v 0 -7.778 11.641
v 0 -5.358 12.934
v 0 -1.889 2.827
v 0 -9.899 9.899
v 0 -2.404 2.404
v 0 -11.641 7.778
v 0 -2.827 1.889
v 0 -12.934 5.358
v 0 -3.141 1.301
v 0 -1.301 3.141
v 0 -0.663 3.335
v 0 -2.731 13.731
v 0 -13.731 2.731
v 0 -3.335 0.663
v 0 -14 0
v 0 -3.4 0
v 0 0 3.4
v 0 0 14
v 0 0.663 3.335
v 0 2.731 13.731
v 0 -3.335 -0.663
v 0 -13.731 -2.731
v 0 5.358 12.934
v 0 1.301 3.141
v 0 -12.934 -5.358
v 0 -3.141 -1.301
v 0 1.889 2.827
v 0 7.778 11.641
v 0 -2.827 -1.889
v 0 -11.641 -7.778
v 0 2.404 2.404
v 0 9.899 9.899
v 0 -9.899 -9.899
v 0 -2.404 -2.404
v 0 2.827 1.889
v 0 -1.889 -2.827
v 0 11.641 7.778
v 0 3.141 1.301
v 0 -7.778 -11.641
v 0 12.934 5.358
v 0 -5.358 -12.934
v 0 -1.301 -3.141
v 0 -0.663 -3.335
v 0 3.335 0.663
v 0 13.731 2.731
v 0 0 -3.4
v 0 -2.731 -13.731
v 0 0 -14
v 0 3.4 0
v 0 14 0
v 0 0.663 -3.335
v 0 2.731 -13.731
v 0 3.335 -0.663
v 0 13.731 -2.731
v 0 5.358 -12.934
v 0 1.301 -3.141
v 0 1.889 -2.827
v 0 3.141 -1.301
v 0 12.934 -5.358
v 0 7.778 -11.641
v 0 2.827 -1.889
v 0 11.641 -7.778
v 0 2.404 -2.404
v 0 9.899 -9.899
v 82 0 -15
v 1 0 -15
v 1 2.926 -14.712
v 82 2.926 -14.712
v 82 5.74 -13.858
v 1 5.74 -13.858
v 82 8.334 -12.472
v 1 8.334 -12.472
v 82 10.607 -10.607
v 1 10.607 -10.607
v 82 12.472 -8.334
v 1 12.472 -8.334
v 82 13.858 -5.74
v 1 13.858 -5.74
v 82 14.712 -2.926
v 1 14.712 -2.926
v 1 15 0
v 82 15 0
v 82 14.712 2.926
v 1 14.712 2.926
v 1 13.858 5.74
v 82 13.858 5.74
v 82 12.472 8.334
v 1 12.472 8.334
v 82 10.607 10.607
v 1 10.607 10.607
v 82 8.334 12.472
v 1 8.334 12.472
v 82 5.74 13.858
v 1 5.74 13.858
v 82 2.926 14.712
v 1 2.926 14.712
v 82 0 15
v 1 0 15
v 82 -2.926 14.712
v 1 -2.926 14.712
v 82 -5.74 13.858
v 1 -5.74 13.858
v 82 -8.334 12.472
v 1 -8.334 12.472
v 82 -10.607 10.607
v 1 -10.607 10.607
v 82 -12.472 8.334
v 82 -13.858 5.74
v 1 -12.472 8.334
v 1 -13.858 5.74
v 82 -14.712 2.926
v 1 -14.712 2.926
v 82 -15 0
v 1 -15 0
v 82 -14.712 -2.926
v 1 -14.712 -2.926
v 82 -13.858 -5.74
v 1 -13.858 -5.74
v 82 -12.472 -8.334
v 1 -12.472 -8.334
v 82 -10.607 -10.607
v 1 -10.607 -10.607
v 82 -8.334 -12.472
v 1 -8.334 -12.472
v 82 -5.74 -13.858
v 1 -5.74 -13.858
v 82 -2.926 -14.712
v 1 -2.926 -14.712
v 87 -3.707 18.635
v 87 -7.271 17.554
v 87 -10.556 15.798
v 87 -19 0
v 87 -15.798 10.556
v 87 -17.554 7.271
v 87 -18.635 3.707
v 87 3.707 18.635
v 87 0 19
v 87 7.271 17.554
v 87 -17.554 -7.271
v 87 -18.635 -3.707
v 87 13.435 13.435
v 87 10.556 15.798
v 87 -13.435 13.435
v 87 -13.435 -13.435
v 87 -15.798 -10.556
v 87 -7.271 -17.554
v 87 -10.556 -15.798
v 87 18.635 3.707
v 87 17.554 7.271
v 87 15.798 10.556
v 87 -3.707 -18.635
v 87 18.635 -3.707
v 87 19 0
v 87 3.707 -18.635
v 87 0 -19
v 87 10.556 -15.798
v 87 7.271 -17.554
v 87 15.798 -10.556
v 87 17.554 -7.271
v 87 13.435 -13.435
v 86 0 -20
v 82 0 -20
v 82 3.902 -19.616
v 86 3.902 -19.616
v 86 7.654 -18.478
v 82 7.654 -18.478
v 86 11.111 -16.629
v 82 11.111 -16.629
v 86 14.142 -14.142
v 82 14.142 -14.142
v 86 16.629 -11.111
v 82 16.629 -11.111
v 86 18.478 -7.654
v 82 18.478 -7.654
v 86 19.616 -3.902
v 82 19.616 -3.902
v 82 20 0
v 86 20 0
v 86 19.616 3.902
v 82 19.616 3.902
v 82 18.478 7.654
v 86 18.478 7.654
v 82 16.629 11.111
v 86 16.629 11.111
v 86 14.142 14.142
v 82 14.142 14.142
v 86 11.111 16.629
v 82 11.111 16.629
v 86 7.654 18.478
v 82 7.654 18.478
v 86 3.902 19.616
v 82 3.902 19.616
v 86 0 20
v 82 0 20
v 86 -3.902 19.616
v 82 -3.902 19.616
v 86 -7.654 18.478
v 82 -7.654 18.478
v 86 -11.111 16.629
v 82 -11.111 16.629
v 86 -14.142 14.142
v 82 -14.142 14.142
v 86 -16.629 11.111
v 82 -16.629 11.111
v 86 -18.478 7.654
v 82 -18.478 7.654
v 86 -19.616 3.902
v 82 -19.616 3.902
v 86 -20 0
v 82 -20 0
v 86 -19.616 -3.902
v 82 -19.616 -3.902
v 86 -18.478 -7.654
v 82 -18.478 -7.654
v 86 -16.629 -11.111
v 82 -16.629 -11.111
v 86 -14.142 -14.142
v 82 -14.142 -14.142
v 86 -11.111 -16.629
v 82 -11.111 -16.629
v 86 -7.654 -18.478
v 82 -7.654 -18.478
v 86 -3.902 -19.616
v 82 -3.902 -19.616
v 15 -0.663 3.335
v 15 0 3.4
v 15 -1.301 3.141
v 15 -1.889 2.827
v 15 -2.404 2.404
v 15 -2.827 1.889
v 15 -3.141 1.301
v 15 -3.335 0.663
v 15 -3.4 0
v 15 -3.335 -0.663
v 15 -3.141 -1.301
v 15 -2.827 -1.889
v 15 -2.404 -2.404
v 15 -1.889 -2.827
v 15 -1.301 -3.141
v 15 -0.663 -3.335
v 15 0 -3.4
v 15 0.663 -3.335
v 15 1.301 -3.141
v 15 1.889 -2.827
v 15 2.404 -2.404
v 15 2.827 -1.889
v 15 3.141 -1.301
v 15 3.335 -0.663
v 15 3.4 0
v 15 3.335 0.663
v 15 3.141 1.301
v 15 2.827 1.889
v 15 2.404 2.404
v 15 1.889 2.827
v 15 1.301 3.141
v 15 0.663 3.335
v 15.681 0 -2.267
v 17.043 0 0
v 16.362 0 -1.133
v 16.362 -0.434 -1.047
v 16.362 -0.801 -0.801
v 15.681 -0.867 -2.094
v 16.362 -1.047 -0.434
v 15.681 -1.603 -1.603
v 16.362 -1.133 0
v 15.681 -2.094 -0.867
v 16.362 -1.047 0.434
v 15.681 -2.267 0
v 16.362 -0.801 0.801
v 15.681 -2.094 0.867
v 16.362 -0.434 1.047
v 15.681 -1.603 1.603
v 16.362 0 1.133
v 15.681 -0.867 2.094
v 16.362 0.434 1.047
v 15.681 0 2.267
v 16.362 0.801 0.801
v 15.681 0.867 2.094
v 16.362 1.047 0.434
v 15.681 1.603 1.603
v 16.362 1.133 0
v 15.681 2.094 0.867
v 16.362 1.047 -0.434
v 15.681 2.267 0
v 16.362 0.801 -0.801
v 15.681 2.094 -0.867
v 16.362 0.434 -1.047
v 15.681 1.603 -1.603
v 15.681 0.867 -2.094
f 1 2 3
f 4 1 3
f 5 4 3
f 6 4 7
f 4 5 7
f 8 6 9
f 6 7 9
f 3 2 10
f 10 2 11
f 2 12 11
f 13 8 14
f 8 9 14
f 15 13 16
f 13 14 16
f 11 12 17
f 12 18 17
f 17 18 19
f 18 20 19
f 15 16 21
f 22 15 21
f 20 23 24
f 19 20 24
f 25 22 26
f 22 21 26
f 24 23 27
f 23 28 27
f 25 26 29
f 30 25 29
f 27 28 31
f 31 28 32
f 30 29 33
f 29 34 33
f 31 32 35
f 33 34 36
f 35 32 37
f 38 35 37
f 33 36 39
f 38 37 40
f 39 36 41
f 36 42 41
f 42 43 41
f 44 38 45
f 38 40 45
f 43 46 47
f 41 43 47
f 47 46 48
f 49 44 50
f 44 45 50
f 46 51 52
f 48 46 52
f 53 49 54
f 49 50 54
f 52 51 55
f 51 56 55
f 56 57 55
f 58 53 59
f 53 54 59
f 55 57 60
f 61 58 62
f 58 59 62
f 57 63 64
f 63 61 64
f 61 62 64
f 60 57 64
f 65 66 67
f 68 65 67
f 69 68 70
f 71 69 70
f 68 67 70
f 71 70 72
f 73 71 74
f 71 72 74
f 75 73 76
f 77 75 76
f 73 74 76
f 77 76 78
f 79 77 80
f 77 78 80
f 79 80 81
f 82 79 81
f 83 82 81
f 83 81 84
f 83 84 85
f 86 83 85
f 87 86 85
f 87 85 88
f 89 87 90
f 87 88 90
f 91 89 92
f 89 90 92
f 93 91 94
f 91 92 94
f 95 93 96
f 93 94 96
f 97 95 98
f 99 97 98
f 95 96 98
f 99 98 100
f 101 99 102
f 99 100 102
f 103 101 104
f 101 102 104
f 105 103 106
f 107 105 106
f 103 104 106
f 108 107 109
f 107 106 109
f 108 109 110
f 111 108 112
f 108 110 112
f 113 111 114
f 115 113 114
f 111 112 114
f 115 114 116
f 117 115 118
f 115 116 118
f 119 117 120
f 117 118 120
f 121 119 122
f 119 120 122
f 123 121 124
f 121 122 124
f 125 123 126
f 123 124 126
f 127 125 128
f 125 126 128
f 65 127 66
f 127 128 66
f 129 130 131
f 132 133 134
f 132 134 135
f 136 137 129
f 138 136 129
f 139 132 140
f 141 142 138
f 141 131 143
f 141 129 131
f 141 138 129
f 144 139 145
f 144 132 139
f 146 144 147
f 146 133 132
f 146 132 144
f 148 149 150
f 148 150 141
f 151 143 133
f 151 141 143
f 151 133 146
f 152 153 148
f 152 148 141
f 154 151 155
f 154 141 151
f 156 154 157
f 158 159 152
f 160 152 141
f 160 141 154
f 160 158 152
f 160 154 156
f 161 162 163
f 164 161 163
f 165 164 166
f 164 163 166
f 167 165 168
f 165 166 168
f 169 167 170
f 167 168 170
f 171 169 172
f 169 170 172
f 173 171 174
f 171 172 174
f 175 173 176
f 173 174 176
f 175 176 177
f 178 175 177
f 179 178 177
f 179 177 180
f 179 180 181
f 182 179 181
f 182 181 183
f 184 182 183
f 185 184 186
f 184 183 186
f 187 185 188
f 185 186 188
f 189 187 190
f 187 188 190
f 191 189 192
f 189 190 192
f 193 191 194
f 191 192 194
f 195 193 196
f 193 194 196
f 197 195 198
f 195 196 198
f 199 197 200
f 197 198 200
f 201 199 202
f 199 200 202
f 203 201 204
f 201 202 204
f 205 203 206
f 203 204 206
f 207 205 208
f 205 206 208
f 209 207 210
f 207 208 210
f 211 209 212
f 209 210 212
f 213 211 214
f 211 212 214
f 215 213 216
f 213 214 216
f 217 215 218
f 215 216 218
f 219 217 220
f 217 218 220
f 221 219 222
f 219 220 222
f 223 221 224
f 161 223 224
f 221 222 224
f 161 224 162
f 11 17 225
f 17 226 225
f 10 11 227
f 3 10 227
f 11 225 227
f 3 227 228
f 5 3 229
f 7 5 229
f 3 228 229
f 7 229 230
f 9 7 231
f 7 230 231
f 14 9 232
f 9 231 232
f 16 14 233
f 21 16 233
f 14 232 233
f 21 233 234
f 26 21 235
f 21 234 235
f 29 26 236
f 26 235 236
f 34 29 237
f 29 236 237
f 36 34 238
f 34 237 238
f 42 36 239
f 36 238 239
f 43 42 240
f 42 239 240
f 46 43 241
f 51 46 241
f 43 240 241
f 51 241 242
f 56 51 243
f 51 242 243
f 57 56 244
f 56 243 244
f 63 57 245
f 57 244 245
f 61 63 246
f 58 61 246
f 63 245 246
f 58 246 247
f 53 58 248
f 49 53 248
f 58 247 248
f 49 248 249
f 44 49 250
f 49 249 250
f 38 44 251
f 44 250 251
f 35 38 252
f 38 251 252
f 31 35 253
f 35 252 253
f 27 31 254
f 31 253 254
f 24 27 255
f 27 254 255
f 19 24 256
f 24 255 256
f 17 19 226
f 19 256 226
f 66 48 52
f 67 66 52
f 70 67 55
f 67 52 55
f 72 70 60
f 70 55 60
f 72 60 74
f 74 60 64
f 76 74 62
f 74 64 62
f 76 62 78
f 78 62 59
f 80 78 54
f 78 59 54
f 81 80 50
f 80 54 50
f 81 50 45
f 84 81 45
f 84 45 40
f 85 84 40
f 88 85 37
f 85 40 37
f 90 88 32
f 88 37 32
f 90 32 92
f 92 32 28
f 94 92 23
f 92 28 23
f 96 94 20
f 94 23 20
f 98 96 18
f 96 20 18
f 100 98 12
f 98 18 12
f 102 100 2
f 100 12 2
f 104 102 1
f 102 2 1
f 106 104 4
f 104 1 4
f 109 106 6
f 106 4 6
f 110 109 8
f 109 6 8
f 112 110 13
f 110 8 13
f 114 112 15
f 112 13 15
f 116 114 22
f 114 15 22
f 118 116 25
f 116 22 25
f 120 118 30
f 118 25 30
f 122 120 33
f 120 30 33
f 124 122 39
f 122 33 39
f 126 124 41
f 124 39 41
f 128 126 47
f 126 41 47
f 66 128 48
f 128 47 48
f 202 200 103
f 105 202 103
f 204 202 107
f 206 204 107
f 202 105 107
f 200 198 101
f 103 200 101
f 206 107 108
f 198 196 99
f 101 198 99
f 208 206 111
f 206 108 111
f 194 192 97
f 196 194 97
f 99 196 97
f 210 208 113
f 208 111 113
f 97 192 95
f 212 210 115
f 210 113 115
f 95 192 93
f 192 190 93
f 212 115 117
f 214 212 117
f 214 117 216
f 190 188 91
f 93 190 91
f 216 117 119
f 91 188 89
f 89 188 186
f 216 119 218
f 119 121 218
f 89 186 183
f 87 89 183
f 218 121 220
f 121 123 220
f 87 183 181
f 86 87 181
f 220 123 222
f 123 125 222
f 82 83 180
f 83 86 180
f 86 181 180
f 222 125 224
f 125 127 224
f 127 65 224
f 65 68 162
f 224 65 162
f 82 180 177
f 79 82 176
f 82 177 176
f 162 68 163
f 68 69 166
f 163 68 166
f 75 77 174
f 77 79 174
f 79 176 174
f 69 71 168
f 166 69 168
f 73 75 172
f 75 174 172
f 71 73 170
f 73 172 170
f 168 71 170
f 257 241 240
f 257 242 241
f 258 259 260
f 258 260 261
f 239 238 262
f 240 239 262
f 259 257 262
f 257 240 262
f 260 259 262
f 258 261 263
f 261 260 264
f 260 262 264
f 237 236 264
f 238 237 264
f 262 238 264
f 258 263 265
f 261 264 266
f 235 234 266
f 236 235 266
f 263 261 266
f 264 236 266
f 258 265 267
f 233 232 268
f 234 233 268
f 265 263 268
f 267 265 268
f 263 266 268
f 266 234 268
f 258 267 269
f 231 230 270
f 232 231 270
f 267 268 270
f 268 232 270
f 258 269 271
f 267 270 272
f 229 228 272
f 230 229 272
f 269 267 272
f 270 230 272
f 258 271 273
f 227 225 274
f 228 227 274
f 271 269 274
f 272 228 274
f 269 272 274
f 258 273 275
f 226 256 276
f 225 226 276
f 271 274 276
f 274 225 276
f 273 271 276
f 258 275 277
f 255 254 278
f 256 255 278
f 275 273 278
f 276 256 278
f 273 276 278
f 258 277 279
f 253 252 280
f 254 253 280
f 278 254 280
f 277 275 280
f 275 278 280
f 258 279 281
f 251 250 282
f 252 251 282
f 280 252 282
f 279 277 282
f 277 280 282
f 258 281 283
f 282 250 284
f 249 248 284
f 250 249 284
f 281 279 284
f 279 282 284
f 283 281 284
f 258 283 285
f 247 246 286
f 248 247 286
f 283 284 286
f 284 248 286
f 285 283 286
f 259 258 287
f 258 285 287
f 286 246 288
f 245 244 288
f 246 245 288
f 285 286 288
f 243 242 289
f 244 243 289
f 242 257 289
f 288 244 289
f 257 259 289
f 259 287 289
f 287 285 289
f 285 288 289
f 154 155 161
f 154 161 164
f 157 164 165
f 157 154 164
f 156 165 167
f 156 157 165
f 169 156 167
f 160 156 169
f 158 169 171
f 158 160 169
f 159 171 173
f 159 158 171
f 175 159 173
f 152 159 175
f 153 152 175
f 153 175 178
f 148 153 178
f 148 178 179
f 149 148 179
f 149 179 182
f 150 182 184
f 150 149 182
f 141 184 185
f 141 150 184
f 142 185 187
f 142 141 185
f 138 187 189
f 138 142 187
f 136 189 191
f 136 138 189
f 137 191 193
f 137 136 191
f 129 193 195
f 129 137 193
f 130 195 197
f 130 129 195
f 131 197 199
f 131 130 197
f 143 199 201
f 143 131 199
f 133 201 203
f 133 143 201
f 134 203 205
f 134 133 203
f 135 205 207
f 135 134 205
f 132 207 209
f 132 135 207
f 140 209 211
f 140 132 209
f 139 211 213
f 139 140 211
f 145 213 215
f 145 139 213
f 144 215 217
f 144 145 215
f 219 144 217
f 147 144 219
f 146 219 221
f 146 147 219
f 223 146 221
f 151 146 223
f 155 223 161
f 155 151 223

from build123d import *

# Parameters (mm, degrees)
SKETCH_1_R             = 15
EXTRUDE_1_DEPTH        = 82
SKETCH_2_R             = 20
EXTRUDE_2_DEPTH        = 5
CHAMFER_1_SIZE         = 1
HOLE_WIZARD_M8_1_D     = 6.8
HOLE_WIZARD_M8_1_DEPTH = 15
HOLE_WIZARD_M8_1_TIP   = 2.042926105


with BuildPart() as part:
    # 草图1 → 凸台-拉伸1 (new body)
    with BuildSketch(Plane(origin=(0, 0, 0), x_dir=(0, 0, -1), z_dir=(1, 0, 0))):
        Circle(SKETCH_1_R)
    extrude(amount=EXTRUDE_1_DEPTH)

    # 草图2 → 凸台-拉伸2 (add)
    with BuildSketch(Plane(origin=(82, 0, 0), x_dir=(0, 0, -1), z_dir=(1, 0, 0))):
        Circle(SKETCH_2_R)
    extrude(amount=EXTRUDE_2_DEPTH)

    # 倒角1
    chamfer_1_edges = [part.edges().sort_by_distance(p)[0] for p in [
        (0, 0, 15),
        (87, 0, 20),
    ]]
    chamfer(chamfer_1_edges, length=CHAMFER_1_SIZE)

    # M8 螺纹孔的螺纹孔钻头1
    with Locations(Plane(origin=(0, 0, 0), x_dir=(0, 0, -1), z_dir=(-1, 0, 0))):
        with Locations((0, 0)):
            Hole(HOLE_WIZARD_M8_1_D / 2, depth=HOLE_WIZARD_M8_1_DEPTH)
            with Locations((0, 0, -(HOLE_WIZARD_M8_1_DEPTH + HOLE_WIZARD_M8_1_TIP / 2))):  # 118° drill point
                Cone(0, HOLE_WIZARD_M8_1_D / 2, HOLE_WIZARD_M8_1_TIP, mode=Mode.SUBTRACT)


solid = part.part
